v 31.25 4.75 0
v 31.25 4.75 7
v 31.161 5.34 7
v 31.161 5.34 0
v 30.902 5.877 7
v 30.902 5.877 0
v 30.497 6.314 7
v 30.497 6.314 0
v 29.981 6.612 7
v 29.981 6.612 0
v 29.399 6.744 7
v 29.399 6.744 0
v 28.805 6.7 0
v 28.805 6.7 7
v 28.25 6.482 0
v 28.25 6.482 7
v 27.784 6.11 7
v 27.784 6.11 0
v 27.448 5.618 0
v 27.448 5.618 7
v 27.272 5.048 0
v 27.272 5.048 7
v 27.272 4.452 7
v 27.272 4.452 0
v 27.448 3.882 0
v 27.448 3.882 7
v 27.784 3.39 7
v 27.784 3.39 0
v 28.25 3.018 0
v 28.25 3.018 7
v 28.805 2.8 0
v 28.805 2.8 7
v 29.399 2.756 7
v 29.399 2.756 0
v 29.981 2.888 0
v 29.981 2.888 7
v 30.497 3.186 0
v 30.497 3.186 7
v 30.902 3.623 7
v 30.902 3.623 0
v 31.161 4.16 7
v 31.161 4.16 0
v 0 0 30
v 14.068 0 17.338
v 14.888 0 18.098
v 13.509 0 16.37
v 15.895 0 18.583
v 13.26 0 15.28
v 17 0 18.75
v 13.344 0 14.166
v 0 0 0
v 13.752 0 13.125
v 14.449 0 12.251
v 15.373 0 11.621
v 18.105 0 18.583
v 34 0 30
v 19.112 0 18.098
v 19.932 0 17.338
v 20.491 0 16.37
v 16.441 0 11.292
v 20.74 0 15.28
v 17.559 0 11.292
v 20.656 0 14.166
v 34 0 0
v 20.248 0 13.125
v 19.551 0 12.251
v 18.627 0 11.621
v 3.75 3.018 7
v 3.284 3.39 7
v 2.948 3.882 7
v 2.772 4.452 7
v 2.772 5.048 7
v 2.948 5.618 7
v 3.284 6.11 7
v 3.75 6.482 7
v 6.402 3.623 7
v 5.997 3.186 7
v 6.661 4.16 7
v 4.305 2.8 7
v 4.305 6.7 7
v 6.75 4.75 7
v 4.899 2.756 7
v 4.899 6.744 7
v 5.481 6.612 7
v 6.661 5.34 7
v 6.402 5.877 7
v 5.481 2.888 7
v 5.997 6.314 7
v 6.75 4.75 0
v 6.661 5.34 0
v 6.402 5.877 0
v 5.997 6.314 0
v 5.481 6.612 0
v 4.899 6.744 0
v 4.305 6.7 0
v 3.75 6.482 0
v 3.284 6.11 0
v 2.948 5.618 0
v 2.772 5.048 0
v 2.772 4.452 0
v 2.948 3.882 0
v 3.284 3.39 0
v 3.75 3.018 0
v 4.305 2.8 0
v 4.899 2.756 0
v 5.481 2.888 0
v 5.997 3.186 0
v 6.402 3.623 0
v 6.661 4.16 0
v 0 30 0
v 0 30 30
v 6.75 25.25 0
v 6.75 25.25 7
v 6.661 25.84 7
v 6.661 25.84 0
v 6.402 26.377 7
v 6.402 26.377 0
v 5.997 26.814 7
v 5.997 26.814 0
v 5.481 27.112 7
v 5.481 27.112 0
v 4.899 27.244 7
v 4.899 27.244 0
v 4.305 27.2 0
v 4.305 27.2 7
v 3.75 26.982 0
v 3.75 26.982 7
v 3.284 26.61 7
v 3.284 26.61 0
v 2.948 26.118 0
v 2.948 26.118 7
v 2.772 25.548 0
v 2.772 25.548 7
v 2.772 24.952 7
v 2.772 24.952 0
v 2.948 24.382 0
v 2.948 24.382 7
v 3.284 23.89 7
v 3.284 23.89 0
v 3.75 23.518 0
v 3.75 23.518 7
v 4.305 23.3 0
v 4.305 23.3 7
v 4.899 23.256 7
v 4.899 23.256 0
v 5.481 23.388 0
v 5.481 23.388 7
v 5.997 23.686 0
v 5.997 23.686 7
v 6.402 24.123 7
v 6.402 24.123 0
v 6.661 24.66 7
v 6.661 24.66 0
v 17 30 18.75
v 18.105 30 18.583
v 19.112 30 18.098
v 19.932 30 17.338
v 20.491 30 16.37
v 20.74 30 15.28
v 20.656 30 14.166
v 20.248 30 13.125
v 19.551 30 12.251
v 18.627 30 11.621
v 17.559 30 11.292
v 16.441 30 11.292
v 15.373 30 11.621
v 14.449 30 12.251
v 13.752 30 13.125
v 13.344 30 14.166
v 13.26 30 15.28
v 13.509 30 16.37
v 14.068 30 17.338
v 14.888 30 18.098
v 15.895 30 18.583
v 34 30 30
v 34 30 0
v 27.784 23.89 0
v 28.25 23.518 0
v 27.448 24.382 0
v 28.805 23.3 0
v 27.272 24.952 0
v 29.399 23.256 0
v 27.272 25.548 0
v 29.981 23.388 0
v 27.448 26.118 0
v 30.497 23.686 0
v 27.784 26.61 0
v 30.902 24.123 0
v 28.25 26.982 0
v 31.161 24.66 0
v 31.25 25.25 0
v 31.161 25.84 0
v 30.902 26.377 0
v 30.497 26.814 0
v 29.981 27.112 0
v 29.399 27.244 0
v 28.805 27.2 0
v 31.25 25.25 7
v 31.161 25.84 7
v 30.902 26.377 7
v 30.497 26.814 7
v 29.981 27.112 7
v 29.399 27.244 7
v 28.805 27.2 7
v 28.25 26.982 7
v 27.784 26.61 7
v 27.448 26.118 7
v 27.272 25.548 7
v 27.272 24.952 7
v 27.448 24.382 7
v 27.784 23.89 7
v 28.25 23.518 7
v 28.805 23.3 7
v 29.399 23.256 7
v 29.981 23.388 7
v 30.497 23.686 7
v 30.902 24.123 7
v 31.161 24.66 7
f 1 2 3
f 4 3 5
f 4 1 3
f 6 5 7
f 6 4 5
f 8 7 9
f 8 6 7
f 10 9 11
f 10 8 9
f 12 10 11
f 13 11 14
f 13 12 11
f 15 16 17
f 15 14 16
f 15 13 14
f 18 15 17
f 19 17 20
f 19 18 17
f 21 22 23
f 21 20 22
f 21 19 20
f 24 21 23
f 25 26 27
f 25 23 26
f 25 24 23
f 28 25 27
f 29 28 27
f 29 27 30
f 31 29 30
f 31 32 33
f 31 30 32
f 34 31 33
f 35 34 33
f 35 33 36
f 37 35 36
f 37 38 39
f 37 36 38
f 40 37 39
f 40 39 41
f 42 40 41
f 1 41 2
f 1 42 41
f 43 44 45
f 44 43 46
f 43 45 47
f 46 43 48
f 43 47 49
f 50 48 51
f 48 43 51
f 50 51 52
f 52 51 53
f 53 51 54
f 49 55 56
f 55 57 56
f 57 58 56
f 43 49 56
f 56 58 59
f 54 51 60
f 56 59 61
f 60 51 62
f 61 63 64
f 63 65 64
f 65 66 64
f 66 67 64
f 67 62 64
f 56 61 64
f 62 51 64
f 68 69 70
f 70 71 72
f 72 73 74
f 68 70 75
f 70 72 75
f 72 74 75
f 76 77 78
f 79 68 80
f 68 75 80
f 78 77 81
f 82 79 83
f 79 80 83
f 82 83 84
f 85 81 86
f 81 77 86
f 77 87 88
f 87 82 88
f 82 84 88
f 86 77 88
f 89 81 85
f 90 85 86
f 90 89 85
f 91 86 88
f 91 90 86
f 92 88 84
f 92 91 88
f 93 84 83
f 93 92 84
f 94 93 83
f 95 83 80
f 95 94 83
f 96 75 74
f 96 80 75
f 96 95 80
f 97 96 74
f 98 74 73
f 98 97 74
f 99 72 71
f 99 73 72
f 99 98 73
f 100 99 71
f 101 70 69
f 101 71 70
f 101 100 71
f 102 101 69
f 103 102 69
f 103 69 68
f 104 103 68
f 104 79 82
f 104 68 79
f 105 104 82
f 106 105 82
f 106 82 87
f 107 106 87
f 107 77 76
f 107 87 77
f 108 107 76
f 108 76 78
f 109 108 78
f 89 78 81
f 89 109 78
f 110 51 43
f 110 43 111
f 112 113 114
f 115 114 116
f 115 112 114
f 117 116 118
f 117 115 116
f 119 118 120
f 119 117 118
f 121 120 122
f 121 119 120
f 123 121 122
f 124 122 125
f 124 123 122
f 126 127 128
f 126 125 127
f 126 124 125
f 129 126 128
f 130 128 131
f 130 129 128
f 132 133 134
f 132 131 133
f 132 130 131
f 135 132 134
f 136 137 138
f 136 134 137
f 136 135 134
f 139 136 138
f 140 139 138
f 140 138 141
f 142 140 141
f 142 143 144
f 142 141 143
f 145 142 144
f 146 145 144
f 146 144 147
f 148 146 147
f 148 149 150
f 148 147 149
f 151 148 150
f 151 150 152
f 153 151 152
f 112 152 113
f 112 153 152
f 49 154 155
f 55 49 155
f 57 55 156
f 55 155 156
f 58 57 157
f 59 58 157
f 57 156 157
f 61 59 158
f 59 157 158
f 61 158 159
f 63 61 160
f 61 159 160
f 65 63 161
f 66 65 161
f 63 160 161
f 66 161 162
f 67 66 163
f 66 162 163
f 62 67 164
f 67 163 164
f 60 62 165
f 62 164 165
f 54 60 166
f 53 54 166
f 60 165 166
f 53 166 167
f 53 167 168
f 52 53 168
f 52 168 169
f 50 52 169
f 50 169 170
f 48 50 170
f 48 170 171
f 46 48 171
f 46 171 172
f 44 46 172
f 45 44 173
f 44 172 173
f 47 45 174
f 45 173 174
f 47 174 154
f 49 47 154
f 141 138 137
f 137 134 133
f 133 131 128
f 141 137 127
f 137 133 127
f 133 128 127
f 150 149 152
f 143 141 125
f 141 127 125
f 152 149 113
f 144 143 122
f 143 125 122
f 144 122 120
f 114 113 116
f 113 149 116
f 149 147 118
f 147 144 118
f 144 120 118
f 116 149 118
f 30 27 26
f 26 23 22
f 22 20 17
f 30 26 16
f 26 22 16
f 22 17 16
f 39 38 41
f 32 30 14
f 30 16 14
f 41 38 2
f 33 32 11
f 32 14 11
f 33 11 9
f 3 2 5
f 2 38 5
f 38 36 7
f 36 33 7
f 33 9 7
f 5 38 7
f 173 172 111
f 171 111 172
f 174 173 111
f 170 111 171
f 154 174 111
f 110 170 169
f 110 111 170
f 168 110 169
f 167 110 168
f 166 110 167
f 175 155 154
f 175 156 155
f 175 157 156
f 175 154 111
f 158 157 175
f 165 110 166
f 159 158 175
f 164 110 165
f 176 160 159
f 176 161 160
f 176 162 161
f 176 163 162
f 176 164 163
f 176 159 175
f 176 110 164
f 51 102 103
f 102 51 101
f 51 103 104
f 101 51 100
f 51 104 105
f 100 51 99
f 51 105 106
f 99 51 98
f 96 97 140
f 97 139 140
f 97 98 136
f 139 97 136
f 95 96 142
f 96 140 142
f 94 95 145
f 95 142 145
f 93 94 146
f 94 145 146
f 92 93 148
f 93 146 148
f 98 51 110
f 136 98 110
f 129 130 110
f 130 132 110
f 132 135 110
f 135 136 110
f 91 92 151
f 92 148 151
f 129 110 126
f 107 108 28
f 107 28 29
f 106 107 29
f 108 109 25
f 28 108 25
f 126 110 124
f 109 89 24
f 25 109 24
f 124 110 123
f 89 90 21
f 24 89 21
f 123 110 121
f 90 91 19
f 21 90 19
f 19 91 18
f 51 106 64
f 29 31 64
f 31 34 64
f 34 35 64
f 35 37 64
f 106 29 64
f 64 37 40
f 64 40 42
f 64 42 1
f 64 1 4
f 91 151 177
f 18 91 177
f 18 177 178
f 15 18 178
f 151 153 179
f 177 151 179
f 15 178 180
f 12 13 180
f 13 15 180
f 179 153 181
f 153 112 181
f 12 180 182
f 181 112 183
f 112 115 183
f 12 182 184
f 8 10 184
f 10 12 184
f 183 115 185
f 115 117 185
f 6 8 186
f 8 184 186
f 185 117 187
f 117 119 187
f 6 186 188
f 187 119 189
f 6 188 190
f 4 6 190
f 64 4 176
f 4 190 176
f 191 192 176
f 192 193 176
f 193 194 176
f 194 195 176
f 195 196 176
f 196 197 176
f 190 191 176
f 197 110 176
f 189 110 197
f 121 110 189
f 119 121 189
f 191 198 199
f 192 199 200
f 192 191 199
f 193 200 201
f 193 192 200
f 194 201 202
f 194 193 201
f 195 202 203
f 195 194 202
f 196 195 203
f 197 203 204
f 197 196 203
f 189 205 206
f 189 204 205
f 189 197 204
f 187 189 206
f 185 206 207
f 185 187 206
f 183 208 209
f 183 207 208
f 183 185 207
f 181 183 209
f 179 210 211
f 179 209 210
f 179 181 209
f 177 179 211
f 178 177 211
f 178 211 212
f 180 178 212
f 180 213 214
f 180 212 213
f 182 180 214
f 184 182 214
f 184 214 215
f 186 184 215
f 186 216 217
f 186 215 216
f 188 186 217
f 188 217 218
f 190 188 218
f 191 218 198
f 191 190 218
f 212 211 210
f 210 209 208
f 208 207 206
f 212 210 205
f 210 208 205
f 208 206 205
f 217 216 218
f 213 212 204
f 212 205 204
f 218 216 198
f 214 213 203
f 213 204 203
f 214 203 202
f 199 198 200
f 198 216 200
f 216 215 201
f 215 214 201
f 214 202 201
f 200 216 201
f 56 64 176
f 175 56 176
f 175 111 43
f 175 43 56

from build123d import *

# Parameters (mm, degrees)
SKETCH1_W           = 34
SKETCH1_H           = 30
SKETCH1_R           = 2
BOSS_EXTRUDE1_DEPTH = 30
SKETCH2_W           = 34
SKETCH2_H           = 30
BOSS_EXTRUDE2_DEPTH = 23
SKETCH3_R           = 3.75
CUT_EXTRUDE1_DEPTH  = 30


with BuildPart() as part:
    # Sketch1 → Boss-Extrude1 (new body)
    with BuildSketch(Plane.XY):
        with Locations((17, 15)):
            Rectangle(SKETCH1_W, SKETCH1_H)
        with Locations((4.75, 25.25)):
            Circle(SKETCH1_R, mode=Mode.SUBTRACT)
        with Locations((29.25, 25.25)):
            Circle(SKETCH1_R, mode=Mode.SUBTRACT)
        with Locations((29.25, 4.75)):
            Circle(SKETCH1_R, mode=Mode.SUBTRACT)
        with Locations((4.75, 4.75)):
            Circle(SKETCH1_R, mode=Mode.SUBTRACT)
    extrude(amount=BOSS_EXTRUDE1_DEPTH)

    # Sketch2 → Boss-Extrude2 (add)
    with BuildSketch(Plane.XY.offset(30)):
        with Locations((17, 15)):
            Rectangle(SKETCH2_W, SKETCH2_H)
    extrude(amount=-BOSS_EXTRUDE2_DEPTH)

    # Sketch3 → Cut-Extrude1 (cut)
    with BuildSketch(Plane(origin=(0, 30, 0), x_dir=(1, 0, 0), z_dir=(0, 1, 0))):
        with Locations(Location((17, -15, 0), (0, 0, 270))):
            Circle(SKETCH3_R)
    extrude(amount=-CUT_EXTRUDE1_DEPTH, mode=Mode.SUBTRACT)


solid = part.part
